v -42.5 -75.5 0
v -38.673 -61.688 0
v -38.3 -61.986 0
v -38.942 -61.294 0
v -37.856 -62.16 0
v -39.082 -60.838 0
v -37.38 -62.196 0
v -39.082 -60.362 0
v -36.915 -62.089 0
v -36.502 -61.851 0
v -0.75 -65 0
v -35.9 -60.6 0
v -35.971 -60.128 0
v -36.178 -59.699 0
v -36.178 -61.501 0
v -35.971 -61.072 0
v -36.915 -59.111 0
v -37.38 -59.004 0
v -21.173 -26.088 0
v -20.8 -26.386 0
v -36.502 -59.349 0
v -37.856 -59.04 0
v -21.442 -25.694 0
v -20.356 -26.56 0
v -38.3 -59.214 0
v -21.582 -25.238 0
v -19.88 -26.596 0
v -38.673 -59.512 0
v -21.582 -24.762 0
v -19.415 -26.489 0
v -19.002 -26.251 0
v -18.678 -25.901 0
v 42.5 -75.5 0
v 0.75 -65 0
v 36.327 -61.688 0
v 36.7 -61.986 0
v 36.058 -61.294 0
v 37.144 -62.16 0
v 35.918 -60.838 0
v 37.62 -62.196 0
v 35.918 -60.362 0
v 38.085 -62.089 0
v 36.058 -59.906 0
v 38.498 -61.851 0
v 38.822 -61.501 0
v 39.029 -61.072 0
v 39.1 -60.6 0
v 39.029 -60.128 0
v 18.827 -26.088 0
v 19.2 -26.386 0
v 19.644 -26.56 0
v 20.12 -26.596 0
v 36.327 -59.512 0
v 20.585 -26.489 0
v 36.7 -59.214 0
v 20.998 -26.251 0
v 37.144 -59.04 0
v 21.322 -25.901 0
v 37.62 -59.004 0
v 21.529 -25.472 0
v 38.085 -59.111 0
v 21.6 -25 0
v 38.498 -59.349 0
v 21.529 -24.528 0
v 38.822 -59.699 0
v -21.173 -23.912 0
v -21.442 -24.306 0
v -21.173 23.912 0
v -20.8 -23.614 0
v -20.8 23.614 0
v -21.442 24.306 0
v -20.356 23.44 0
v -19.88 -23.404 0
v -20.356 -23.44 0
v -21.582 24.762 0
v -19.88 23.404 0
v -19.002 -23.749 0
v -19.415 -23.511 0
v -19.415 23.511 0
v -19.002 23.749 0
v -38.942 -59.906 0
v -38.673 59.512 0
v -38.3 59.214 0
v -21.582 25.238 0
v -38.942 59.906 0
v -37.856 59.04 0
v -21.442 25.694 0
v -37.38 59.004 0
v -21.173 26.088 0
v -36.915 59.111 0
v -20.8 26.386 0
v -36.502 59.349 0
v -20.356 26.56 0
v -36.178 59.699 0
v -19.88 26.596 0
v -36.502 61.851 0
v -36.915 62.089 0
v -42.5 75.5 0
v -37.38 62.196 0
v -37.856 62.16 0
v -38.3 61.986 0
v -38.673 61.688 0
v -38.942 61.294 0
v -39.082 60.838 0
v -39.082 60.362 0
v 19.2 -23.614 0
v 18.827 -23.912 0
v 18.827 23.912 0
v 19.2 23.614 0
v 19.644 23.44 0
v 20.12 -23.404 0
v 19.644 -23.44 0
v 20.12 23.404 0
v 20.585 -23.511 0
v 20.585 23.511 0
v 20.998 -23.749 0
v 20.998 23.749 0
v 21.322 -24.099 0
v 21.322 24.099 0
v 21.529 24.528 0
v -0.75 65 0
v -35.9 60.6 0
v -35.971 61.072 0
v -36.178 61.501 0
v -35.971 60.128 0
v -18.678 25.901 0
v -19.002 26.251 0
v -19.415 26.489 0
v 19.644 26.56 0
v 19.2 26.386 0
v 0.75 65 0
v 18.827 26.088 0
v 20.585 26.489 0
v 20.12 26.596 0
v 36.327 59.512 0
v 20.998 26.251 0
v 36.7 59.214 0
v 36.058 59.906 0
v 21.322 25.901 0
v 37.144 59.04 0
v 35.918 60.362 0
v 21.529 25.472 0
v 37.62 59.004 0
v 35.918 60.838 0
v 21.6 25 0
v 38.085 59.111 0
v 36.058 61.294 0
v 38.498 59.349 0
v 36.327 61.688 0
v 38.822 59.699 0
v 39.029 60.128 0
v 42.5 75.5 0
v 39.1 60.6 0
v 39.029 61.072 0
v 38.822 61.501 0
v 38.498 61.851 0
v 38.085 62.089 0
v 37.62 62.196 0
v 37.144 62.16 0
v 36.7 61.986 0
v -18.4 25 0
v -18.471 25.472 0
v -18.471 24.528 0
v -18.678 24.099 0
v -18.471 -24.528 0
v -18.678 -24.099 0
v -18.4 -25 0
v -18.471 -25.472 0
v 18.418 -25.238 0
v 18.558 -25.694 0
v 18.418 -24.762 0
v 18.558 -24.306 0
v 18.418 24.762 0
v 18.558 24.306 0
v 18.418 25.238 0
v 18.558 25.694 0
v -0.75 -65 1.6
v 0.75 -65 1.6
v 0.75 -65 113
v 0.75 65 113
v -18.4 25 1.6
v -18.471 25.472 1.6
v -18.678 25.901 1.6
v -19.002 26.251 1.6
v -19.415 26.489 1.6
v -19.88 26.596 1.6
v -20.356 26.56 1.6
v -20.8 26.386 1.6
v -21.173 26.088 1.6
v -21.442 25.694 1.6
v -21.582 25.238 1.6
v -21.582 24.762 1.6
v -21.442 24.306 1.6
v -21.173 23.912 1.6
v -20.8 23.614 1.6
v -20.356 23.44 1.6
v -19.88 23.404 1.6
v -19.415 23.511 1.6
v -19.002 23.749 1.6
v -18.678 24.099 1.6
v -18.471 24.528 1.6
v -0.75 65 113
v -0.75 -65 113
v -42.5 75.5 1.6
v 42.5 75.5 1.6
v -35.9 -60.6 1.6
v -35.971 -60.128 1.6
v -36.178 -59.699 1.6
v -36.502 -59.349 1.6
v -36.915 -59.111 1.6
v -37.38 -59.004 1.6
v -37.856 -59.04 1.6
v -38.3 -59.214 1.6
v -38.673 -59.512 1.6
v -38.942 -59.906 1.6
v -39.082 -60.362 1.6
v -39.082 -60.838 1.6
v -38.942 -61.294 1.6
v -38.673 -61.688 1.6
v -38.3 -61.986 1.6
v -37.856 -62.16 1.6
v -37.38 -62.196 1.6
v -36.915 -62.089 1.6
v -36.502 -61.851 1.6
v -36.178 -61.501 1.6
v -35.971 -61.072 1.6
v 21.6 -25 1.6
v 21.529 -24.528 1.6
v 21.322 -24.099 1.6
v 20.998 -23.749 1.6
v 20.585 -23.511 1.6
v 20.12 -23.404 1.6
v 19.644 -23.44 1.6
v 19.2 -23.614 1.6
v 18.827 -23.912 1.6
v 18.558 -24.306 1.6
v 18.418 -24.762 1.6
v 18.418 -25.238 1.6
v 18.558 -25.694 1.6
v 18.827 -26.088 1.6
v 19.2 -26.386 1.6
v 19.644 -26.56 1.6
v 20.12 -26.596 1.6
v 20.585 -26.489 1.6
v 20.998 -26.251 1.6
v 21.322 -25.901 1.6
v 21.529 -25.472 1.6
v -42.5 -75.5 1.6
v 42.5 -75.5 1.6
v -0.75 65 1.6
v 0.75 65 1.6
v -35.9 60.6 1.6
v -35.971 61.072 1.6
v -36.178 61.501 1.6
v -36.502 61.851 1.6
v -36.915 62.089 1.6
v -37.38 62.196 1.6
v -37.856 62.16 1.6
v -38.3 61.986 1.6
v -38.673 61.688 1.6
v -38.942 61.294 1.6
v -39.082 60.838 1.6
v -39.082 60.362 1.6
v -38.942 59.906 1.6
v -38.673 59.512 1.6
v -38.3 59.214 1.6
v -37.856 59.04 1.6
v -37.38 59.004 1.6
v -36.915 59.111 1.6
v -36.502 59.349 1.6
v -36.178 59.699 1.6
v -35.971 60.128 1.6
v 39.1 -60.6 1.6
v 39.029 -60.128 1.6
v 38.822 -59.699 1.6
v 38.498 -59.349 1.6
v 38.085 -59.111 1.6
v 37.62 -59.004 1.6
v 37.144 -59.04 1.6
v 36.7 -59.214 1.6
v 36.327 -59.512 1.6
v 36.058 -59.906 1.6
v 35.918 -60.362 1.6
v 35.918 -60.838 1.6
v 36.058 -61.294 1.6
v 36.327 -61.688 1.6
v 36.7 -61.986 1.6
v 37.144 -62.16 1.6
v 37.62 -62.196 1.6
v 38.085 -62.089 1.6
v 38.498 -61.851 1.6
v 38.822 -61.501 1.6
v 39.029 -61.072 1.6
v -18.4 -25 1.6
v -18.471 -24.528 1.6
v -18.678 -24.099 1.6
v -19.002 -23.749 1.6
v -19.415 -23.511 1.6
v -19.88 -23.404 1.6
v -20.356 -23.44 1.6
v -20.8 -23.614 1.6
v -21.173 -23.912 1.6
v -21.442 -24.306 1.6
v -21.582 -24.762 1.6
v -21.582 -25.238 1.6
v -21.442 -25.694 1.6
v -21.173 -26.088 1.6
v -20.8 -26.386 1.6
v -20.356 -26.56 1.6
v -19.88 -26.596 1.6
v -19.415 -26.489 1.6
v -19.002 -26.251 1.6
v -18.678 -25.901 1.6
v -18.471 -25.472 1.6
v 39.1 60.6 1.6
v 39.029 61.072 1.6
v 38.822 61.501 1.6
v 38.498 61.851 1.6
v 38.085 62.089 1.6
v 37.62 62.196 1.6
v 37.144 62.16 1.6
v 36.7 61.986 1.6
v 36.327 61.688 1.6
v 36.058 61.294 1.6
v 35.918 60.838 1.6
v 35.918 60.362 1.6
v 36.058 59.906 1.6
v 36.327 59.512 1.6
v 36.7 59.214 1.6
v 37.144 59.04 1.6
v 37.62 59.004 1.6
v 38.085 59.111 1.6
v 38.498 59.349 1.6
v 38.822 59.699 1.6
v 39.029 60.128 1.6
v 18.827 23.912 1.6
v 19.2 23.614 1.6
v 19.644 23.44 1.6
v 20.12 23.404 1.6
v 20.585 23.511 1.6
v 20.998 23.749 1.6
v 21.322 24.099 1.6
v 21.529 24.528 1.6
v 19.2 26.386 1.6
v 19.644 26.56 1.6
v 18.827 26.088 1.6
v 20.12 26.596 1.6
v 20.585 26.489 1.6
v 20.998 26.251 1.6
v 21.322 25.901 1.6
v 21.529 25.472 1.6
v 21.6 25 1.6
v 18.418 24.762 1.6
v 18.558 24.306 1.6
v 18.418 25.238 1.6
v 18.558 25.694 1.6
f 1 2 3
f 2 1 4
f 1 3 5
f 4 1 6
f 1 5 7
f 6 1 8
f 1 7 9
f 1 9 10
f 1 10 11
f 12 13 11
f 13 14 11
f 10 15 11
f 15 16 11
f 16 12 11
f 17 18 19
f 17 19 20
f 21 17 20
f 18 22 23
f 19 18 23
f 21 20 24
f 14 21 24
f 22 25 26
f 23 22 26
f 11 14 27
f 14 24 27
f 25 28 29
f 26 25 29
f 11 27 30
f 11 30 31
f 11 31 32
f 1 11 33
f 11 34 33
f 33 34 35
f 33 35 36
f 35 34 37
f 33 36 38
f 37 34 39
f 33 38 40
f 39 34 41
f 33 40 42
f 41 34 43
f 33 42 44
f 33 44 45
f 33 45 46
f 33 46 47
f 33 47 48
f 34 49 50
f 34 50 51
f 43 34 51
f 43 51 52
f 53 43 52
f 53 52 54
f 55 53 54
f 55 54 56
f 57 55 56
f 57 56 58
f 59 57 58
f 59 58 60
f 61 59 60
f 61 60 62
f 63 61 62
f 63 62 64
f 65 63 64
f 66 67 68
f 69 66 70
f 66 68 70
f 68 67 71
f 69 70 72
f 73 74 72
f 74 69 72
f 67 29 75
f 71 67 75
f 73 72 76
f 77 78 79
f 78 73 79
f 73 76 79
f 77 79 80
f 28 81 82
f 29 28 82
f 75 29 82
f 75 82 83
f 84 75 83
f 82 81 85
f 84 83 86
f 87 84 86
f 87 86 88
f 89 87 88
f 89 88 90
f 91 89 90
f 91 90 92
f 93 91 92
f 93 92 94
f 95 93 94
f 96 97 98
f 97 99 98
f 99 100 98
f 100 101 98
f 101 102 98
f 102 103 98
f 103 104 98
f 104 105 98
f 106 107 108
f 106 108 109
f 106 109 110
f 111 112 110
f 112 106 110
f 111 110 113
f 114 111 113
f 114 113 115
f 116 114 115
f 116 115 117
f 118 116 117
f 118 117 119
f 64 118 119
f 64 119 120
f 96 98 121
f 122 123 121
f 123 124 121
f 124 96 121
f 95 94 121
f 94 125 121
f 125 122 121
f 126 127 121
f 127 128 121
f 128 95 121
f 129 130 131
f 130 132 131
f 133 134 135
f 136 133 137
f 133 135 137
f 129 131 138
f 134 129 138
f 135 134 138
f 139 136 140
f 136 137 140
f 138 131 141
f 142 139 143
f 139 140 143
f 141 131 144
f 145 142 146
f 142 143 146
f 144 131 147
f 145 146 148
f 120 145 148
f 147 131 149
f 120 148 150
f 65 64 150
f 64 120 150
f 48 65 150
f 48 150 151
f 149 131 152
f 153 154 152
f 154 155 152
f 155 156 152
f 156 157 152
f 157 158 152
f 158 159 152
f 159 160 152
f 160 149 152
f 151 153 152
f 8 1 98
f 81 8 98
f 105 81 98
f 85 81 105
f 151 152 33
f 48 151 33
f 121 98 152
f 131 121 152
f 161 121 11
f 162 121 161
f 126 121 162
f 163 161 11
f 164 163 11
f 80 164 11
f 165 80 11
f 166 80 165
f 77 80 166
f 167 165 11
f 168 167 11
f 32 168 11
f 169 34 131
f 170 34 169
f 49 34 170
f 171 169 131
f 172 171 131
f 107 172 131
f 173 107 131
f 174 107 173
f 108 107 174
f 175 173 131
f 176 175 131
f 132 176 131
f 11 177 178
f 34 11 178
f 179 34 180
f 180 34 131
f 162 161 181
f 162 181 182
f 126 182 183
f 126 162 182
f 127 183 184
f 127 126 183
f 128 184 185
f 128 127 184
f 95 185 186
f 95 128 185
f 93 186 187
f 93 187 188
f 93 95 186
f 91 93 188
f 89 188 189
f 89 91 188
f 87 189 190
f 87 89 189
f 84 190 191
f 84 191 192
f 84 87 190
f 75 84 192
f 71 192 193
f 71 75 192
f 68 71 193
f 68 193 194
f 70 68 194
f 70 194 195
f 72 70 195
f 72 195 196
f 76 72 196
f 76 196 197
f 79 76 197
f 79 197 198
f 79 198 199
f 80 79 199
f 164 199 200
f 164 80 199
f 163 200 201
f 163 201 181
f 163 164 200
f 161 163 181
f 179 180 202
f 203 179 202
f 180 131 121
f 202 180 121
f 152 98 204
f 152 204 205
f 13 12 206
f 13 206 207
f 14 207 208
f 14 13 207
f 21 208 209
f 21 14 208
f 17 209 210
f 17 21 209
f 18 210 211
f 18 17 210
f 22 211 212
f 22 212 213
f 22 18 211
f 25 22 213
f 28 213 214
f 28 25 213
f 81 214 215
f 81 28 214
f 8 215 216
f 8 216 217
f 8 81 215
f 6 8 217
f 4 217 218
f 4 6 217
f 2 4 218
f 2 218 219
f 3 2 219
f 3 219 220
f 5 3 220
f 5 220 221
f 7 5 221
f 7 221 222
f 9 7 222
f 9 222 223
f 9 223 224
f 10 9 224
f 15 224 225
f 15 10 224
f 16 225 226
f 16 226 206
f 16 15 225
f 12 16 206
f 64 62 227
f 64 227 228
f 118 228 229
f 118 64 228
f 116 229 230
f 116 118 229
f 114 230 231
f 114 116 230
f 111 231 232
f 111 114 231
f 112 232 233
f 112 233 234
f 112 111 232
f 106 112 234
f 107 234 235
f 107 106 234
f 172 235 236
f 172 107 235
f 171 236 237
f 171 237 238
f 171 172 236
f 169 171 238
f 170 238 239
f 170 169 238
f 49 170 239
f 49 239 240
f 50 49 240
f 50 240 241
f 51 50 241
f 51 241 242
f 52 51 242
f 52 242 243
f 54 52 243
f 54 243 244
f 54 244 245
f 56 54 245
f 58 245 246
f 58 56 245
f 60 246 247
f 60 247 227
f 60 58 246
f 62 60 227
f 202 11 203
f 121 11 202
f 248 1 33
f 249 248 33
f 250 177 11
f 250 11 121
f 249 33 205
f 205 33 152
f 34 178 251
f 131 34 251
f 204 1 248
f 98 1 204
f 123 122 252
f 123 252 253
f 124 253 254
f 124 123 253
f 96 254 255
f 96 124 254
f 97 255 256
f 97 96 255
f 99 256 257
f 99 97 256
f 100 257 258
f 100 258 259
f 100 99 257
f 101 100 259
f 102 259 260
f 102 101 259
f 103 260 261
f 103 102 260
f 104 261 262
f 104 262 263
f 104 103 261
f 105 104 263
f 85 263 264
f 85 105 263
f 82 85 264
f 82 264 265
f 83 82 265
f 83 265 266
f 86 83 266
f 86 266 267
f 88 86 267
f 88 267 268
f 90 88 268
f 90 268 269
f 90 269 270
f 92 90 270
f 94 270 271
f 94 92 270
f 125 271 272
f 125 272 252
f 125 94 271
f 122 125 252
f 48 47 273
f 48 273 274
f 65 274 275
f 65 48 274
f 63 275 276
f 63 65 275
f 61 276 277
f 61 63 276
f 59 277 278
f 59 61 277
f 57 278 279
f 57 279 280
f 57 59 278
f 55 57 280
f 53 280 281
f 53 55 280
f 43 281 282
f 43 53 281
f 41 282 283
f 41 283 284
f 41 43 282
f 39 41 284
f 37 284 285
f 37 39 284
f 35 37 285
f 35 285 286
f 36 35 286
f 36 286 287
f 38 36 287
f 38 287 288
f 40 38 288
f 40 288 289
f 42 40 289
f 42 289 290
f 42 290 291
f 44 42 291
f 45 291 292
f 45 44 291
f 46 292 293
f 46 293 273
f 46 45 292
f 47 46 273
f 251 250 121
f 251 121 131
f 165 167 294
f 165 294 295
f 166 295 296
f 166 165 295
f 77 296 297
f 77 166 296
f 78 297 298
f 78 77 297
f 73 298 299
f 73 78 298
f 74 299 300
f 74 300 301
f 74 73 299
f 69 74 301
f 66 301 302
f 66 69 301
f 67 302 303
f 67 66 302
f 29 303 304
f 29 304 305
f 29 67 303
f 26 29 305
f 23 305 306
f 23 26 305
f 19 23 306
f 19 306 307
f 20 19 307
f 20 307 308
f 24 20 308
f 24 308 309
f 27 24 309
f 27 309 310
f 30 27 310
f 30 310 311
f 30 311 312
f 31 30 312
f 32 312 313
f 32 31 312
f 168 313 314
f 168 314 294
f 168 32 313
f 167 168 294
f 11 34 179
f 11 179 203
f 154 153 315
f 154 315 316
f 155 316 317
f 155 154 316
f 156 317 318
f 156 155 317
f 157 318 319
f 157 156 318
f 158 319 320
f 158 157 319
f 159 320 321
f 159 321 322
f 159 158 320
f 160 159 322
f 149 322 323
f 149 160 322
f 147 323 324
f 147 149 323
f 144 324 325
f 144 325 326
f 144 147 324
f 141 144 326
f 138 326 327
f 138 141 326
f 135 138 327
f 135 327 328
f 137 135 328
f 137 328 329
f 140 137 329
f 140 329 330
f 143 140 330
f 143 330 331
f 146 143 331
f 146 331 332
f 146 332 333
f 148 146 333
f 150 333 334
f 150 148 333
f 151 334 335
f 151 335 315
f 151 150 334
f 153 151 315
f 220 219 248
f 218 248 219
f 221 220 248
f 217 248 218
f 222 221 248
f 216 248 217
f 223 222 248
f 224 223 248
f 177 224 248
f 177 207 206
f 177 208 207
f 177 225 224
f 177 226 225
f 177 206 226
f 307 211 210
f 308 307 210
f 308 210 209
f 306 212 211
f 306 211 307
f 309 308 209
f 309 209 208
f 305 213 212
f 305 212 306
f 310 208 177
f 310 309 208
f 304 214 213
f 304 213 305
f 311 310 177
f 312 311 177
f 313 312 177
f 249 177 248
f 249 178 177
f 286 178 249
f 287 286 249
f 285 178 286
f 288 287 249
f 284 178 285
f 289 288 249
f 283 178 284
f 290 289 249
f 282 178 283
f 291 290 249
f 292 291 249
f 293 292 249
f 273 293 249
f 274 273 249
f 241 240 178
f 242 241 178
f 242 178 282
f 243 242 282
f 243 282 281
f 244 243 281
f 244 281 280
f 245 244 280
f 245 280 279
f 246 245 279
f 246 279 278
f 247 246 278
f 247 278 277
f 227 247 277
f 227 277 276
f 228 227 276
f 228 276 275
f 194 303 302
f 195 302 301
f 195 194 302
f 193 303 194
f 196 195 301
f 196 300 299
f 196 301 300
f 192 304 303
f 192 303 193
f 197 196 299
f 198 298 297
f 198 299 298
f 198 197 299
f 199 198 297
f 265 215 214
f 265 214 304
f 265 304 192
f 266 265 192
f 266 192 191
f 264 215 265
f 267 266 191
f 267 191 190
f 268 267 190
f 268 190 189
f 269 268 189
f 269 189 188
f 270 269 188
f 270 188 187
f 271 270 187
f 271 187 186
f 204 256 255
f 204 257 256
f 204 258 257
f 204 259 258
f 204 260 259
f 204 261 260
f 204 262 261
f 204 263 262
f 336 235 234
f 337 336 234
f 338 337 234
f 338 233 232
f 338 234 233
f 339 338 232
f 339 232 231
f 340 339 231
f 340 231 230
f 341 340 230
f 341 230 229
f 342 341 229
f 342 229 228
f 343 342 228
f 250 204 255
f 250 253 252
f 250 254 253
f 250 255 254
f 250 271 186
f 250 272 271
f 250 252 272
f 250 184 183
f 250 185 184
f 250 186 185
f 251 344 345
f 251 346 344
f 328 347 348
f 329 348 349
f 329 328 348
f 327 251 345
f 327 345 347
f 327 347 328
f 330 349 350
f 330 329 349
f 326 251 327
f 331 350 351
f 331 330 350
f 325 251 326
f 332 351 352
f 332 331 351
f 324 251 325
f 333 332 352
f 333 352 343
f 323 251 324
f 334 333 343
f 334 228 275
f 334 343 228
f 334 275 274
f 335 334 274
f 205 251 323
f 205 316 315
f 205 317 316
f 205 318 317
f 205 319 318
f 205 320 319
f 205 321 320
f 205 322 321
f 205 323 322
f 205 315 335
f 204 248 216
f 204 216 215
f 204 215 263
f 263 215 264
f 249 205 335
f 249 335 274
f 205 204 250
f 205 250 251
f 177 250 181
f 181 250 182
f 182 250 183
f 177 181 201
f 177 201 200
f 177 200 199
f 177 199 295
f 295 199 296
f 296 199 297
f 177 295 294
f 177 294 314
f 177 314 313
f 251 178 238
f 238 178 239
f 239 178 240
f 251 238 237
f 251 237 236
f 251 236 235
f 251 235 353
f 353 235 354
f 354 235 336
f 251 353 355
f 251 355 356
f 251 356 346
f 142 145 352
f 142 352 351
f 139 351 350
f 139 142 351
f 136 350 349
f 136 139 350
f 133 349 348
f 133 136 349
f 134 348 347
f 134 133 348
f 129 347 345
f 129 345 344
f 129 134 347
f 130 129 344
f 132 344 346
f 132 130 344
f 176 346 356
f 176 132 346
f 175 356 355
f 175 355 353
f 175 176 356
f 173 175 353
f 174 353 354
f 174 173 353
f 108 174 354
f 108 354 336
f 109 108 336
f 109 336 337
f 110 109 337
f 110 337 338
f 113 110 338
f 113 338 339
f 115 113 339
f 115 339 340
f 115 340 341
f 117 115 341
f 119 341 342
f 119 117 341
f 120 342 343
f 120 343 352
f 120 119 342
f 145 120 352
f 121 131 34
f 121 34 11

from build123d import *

# Parameters (mm, degrees)
SKETCH2_W           = 85
SKETCH2_H           = 151
SKETCH2_R           = 1.6
BOSS_EXTRUDE1_DEPTH = 1.6
SKETCH3_W           = 1.5
SKETCH3_H           = 130
CUT_EXTRUDE1_DEPTH  = 1.6
SKETCH4_W           = 1.5
SKETCH4_H           = 130
BOSS_EXTRUDE2_DEPTH = 113


with BuildPart() as part:
    # Sketch2 → Boss-Extrude1 (new body)
    with BuildSketch(Plane.XY):
        Rectangle(SKETCH2_W, SKETCH2_H)
        with Locations((37.5, 60.6)):
            Circle(SKETCH2_R, mode=Mode.SUBTRACT)
        with Locations((-37.5, 60.6)):
            Circle(SKETCH2_R, mode=Mode.SUBTRACT)
        with Locations((-37.5, -60.6)):
            Circle(SKETCH2_R, mode=Mode.SUBTRACT)
        with Locations((37.5, -60.6)):
            Circle(SKETCH2_R, mode=Mode.SUBTRACT)
        with Locations((-20, 25)):
            Circle(SKETCH2_R, mode=Mode.SUBTRACT)
        with Locations((20, 25)):
            Circle(SKETCH2_R, mode=Mode.SUBTRACT)
        with Locations((20, -25)):
            Circle(SKETCH2_R, mode=Mode.SUBTRACT)
        with Locations((-20, -25)):
            Circle(SKETCH2_R, mode=Mode.SUBTRACT)
    extrude(amount=BOSS_EXTRUDE1_DEPTH)

    # Sketch3 → Cut-Extrude1 (cut)
    with BuildSketch(Plane.XY.offset(1.6)):
        Rectangle(SKETCH3_W, SKETCH3_H)
    extrude(amount=-CUT_EXTRUDE1_DEPTH, mode=Mode.SUBTRACT)


with BuildPart() as body_2:
    # Sketch4 → Boss-Extrude2 (new body)
    with BuildSketch(Plane(origin=(0, 0, 0), x_dir=(-1, 0, 0), z_dir=(0, 0, -1))):
        Rectangle(SKETCH4_W, SKETCH4_H)
    extrude(amount=-BOSS_EXTRUDE2_DEPTH)


solid = Compound([part.part, body_2.part])
